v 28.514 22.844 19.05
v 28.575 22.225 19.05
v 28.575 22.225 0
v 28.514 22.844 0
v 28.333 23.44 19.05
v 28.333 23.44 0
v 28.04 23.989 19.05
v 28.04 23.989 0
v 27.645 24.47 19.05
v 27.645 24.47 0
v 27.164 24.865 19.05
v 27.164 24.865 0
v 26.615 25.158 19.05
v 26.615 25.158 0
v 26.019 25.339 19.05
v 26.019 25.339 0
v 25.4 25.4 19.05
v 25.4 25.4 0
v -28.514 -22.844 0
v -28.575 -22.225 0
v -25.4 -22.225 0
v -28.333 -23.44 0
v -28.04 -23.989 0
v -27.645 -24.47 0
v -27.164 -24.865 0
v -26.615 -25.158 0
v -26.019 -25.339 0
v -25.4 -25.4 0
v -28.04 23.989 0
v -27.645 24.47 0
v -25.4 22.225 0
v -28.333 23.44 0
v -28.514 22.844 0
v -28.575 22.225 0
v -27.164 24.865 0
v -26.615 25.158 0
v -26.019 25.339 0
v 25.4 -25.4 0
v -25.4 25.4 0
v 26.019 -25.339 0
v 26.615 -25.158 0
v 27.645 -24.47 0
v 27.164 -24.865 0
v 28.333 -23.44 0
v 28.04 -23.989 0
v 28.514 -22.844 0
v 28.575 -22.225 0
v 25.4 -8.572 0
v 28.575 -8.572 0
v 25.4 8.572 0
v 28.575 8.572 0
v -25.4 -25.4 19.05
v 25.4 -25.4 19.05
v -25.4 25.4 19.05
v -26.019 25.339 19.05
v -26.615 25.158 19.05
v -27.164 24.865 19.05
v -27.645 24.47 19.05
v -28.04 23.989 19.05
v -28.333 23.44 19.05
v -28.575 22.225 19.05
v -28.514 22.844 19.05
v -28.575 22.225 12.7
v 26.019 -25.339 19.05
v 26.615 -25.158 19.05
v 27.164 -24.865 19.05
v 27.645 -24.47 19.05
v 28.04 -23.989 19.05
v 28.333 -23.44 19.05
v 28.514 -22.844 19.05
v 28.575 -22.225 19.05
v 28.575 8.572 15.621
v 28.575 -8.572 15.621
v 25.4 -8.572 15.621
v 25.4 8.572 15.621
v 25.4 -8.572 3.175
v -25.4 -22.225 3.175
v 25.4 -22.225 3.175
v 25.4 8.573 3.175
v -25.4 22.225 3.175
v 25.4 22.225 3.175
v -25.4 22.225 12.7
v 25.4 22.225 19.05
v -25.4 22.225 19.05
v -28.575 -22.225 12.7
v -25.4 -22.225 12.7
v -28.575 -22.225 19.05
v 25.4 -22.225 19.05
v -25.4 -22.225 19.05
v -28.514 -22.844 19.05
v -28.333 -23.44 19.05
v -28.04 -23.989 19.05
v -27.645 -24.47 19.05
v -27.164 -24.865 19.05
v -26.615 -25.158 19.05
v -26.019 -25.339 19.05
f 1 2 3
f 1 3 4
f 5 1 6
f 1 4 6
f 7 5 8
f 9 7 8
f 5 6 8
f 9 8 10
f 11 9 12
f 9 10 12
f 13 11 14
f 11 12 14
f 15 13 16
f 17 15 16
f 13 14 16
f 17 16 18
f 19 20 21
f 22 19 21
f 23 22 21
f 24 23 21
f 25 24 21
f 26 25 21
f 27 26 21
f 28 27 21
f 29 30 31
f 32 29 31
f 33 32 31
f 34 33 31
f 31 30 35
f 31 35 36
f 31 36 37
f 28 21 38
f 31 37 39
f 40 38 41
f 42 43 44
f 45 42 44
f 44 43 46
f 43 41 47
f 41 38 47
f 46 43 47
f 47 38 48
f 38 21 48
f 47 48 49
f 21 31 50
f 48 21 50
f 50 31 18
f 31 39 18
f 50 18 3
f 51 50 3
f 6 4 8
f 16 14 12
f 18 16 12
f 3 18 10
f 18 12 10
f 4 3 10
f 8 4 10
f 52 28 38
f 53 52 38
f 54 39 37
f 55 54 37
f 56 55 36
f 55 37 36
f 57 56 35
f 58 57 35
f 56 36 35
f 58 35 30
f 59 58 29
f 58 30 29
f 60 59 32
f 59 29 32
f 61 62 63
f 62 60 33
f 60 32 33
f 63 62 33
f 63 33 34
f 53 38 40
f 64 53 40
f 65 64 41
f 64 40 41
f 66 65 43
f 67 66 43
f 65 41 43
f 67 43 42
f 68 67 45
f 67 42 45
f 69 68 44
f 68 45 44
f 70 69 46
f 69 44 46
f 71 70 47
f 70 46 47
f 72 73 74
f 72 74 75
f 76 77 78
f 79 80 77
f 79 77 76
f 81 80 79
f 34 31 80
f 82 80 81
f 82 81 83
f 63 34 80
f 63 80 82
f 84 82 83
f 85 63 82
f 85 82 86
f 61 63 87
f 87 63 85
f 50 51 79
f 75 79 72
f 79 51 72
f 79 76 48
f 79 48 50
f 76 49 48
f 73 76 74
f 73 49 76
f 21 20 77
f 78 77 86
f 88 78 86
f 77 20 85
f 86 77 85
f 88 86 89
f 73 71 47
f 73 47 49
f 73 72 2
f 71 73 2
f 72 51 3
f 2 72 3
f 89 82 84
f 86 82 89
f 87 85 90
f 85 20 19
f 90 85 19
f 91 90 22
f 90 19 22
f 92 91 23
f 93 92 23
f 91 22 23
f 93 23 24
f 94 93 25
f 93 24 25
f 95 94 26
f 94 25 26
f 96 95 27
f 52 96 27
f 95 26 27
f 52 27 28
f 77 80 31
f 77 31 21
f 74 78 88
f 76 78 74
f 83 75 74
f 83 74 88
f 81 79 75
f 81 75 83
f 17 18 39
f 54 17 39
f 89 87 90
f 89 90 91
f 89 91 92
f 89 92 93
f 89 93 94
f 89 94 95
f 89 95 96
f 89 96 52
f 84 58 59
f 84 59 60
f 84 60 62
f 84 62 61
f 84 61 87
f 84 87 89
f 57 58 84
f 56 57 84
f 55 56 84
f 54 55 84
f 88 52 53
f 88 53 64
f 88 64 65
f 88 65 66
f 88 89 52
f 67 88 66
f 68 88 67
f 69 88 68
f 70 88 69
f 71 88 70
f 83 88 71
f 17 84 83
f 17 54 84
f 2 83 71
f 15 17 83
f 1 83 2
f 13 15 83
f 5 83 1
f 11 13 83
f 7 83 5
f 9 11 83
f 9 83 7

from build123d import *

# Parameters (mm, degrees)
F1_DEPTH = 19.05
F2_T     = 3.175
F3_W     = 17.145
F3_H     = 15.621
F4_DEPTH = 3.175
F5_W     = 44.45
F5_H     = 12.7
F6_DEPTH = 3.175


# Not quite as in the source:
# - a shell that OpenCascade refuses in one call is made with other operations: the cavity is built on its own and cut out


with BuildPart() as f1:
    # F0 (on Top) → F1 (new body)
    with BuildSketch(Plane.XY):
        with BuildLine():
            Line((-25.4, -25.4), (25.4, -25.4))
            ThreePointArc((25.4, -25.4), (27.6450640303, -24.4700640303), (28.575, -22.225))
            Line((28.575, -22.225), (28.575, 22.225))
            ThreePointArc((28.575, 22.225), (27.6450640303, 24.4700640303), (25.4, 25.4))
            Line((25.4, 25.4), (-25.4, 25.4))
            ThreePointArc((-25.4, 25.4), (-27.6450640303, 24.4700640303), (-28.575, 22.225))
            Line((-28.575, 22.225), (-28.575, -22.225))
            ThreePointArc((-28.575, -22.225), (-27.6450640303, -24.4700640303), (-25.4, -25.4))
        make_face()
    extrude(amount=F1_DEPTH)

    # F2: shell of thickness 3.175, made by hand


with BuildPart() as f2_core1:
    # F2_t2: copy of F1
    add(f1.part)

    # the walls: a layer under each face that stays
    f2_faces = [f2_core1.faces().sort_by_distance(p)[0] for p in [
        (0, -25.4, 9.525),
        (28.575, 0, 9.525),
        (0, 25.4, 9.525),
        (-28.575, 0, 9.525),
        (0, 0, 0),
    ]]
    thicken(f2_faces, amount=-F2_T, mode=Mode.SUBTRACT)


with BuildPart() as f1_1:
    add(f1.part)

    # what is left inside the walls is the cavity
    f2_cavity = [f2_core1.part.solids().sort_by_distance(p)[0] for p in [
        (0, -7.408333, 3.20675),
    ]]
    add(f2_cavity, mode=Mode.SUBTRACT)

    # F3 (on face) → F4 (cut)
    with BuildSketch(Plane.YZ.offset(28.575)):
        with Locations((0, 7.8105)):
            Rectangle(F3_W, F3_H)
    extrude(amount=-F4_DEPTH, mode=Mode.SUBTRACT)

    # F5 (on face) → F6 (cut)
    with BuildSketch(Plane(origin=(-28.575, 0, 0), x_dir=(0, -1, 0), z_dir=(-1, 0, 0))):
        with Locations((0, 6.35)):
            Rectangle(F5_W, F5_H)
    extrude(amount=-F6_DEPTH, mode=Mode.SUBTRACT)


solid = f1_1.part
